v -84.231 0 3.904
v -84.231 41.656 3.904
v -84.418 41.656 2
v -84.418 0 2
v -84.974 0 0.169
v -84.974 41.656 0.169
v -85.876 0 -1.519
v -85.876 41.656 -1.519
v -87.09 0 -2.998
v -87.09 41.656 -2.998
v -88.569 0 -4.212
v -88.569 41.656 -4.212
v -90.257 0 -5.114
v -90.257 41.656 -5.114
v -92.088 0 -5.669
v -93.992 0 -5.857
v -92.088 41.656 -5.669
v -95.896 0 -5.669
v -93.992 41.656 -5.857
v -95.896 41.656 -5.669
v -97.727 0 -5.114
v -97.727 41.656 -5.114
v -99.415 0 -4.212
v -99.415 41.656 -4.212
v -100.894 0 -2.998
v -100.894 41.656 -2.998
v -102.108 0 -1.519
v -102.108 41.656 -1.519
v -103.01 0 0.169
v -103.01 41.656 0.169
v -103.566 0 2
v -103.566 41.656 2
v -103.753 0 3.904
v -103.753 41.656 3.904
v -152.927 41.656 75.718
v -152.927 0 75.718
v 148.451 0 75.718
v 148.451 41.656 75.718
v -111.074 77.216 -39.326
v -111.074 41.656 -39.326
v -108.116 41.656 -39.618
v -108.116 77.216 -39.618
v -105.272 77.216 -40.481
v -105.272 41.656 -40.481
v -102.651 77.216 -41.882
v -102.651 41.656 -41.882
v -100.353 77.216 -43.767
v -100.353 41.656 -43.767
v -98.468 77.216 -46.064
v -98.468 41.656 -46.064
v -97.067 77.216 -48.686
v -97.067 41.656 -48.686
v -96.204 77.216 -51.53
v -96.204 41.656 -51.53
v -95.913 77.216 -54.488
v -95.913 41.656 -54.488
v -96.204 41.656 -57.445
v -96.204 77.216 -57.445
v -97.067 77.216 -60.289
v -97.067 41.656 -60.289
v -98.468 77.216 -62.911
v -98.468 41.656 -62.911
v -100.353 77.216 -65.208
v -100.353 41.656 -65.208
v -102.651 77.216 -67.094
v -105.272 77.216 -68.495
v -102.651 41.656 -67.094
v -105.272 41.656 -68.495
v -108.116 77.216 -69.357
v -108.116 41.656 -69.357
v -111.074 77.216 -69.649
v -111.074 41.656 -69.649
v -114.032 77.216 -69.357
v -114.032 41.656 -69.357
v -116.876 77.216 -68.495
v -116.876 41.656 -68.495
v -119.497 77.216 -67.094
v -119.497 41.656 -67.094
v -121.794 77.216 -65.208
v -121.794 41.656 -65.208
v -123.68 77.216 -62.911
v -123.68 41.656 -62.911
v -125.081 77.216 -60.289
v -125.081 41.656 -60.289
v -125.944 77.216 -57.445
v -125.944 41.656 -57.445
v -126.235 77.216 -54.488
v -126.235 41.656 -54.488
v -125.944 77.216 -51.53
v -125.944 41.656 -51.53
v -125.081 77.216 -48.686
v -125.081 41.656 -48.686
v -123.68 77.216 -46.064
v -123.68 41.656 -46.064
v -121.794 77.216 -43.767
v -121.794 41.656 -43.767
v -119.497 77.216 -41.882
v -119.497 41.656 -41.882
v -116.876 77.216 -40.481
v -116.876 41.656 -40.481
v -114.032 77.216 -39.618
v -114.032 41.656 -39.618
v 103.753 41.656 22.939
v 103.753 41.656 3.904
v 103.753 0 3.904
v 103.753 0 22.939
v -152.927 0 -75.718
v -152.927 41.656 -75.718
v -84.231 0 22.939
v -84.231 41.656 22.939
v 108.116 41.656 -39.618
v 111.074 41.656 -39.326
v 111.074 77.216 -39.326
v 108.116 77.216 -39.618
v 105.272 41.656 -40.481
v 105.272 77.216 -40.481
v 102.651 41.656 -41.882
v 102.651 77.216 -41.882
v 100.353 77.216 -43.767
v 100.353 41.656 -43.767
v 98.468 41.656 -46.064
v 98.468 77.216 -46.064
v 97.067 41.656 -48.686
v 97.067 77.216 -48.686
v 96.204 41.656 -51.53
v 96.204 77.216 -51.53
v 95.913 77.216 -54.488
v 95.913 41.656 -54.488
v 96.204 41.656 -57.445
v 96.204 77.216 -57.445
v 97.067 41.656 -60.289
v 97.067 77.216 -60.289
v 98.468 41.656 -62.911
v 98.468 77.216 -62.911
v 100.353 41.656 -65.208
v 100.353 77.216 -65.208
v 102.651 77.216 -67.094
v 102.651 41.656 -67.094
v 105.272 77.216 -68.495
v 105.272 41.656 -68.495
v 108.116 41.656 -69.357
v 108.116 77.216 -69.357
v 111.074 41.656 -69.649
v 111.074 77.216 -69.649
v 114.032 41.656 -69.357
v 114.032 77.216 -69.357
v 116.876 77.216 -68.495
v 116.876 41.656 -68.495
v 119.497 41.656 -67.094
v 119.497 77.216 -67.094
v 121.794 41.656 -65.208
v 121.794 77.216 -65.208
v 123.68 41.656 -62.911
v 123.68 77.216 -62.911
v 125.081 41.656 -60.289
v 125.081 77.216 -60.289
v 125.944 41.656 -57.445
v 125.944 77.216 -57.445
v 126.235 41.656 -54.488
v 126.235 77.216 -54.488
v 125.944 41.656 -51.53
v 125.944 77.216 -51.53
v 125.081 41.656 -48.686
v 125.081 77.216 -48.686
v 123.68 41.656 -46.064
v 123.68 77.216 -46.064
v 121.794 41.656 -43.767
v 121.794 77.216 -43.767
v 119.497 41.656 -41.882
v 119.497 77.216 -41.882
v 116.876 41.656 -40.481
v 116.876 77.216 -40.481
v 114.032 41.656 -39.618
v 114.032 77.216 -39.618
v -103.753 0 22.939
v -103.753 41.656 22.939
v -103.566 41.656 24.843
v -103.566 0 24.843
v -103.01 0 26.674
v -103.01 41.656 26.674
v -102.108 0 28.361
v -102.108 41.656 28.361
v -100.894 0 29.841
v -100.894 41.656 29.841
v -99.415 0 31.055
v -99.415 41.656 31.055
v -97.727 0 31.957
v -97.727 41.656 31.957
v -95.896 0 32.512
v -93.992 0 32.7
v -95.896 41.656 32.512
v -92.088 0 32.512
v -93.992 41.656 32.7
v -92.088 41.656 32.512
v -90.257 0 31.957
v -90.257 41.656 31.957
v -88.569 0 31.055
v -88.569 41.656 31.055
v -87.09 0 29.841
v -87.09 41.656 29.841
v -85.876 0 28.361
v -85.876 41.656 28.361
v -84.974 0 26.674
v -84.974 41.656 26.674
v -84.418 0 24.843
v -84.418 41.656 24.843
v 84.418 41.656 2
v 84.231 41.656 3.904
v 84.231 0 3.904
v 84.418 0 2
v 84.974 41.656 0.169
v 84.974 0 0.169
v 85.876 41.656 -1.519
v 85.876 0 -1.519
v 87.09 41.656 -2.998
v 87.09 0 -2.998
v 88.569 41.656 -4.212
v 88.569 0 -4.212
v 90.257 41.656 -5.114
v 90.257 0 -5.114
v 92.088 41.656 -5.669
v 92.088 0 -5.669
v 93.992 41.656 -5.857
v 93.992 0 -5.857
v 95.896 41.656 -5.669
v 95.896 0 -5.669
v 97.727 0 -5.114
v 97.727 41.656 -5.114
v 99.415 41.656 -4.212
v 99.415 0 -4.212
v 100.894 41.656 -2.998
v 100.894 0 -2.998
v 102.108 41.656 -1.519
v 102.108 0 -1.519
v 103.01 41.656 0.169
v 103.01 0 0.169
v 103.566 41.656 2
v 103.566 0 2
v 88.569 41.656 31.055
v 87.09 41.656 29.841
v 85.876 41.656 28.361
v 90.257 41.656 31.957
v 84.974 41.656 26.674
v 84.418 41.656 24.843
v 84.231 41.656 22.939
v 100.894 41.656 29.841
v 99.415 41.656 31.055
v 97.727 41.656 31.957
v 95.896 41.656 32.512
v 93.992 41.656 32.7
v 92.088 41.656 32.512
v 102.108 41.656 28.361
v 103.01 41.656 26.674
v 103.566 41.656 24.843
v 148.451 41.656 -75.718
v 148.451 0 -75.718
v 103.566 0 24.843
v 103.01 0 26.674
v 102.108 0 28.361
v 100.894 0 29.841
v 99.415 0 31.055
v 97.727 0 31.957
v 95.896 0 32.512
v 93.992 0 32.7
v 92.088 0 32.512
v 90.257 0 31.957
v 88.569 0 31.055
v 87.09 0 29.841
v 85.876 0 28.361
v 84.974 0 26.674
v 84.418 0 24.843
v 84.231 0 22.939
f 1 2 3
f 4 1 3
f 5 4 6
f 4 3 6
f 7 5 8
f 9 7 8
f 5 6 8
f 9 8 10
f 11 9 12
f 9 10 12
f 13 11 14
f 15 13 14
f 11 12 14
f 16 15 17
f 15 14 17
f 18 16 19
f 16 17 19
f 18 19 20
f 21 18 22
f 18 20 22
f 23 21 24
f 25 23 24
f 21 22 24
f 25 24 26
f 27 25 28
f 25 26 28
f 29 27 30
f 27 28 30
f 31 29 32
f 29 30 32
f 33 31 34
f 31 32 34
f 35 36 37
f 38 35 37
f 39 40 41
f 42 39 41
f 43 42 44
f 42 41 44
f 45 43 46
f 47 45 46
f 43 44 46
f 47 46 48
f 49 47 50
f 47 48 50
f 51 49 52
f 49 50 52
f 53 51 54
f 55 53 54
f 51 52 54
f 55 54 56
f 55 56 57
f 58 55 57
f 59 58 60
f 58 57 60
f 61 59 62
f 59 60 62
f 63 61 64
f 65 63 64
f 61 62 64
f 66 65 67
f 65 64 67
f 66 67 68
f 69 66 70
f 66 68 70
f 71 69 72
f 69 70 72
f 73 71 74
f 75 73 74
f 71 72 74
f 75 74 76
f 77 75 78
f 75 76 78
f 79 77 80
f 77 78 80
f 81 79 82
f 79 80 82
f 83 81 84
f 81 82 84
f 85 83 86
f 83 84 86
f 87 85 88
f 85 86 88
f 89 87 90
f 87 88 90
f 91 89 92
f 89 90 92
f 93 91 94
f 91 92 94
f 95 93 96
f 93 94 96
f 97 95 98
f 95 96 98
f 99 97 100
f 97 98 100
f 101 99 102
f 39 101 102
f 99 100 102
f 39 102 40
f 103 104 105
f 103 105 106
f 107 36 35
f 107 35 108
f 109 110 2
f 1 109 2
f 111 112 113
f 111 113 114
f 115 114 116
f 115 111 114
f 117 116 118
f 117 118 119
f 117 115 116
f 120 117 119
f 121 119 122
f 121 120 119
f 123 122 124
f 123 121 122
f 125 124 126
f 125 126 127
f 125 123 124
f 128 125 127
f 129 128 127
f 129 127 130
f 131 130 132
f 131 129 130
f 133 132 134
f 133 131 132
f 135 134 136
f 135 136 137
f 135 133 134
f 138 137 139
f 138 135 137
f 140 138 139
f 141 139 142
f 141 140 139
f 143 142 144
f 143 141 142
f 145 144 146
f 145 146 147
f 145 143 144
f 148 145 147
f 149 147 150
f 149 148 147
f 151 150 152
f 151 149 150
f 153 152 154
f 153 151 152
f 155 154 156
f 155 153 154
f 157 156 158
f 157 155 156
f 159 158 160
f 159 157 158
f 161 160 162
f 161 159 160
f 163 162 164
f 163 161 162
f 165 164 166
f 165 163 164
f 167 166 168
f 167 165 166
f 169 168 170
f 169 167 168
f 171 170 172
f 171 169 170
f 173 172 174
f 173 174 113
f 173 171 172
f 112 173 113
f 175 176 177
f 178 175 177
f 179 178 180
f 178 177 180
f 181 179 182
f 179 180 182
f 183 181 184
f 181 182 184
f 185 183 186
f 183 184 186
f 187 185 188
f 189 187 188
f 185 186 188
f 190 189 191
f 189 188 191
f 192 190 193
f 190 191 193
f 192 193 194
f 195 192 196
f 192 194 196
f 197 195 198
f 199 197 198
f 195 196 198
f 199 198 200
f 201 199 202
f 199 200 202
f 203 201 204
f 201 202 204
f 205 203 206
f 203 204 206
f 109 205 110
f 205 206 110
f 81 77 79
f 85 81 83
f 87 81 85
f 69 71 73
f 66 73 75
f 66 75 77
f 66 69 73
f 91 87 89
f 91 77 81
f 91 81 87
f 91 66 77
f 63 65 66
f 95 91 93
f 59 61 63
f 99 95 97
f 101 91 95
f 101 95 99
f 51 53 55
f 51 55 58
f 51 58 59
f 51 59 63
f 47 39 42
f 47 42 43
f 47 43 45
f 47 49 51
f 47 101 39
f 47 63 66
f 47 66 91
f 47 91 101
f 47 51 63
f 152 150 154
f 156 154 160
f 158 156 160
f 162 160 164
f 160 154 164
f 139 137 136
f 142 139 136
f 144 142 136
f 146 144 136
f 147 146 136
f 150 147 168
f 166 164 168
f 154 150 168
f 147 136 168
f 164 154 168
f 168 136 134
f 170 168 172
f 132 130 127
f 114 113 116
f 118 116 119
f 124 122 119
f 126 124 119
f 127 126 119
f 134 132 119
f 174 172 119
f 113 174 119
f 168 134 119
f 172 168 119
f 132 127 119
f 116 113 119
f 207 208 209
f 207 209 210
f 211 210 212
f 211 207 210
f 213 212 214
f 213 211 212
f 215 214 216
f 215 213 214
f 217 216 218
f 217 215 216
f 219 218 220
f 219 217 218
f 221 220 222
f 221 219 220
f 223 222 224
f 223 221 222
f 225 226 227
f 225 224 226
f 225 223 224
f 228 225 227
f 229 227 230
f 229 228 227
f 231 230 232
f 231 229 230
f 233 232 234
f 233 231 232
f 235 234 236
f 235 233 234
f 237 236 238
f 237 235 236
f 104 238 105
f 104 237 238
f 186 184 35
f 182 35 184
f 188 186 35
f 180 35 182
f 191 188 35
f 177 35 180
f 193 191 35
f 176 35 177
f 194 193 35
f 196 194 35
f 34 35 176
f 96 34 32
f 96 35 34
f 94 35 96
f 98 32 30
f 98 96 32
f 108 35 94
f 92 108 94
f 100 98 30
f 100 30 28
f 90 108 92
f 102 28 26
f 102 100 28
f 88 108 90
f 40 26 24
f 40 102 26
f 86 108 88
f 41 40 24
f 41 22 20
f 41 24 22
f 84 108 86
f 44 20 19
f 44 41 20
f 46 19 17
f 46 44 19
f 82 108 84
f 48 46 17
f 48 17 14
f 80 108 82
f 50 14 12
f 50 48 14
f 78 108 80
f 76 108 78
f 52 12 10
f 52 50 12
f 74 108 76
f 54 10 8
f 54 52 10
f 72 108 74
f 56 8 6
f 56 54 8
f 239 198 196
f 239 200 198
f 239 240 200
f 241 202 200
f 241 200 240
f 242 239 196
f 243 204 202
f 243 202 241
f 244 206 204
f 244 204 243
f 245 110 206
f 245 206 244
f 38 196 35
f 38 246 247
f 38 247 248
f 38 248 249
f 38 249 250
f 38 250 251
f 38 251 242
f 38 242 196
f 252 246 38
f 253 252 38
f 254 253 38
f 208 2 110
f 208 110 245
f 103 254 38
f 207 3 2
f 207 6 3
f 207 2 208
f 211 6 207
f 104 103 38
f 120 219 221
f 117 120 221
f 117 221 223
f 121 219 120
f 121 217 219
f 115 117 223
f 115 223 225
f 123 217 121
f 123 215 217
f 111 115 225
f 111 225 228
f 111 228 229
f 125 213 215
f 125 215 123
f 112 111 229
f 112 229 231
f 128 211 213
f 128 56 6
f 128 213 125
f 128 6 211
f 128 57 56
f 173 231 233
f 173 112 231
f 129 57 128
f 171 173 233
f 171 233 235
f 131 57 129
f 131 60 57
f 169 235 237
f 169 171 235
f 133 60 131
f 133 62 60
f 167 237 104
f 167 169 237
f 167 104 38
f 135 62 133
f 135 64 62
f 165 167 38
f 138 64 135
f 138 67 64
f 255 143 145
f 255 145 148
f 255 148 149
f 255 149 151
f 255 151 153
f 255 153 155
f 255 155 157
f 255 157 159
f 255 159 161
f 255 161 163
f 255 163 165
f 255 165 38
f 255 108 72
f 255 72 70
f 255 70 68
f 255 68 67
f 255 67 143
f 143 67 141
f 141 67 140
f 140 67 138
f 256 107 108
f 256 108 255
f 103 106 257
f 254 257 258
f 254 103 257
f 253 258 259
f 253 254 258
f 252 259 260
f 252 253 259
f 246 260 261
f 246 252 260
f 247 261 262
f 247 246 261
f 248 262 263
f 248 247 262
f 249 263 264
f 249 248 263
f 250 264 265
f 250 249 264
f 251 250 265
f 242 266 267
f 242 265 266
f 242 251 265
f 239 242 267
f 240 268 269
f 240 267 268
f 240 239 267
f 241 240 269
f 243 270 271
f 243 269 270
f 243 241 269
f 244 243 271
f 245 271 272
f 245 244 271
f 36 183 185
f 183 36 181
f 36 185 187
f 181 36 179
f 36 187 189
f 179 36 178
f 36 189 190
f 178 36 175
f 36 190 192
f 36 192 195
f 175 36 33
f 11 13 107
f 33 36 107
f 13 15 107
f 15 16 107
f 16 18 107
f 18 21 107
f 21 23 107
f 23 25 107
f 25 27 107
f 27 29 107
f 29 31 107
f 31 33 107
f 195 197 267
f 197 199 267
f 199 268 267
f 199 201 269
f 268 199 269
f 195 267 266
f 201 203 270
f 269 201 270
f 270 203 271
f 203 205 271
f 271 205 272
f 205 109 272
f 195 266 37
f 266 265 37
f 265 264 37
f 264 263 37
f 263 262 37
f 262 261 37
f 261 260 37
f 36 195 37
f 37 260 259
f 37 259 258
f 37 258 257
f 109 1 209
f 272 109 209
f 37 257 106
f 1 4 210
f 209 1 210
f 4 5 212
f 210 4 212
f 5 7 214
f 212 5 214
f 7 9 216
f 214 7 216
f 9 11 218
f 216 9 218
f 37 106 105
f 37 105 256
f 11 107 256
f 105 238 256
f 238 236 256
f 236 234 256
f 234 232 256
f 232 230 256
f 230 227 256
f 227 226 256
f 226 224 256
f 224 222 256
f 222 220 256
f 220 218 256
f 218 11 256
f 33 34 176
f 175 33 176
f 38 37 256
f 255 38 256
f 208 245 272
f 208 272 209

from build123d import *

# Parameters (mm, degrees)
SKETCH1_W           = 301.378206246
SKETCH1_H           = 151.435088782
BOSS_EXTRUDE1_DEPTH = 41.656
CUT_EXTRUDE1_DEPTH  = 214.376
SKETCH3_R           = 15.161110792
BOSS_EXTRUDE2_DEPTH = 35.56


with BuildPart() as part:
    # Sketch1 → Boss-Extrude1 (new body)
    with BuildSketch(Plane(origin=(0, 0, 0), x_dir=(1, 0, 0), z_dir=(0, 1, 0))):
        with Locations((-2.237956977, 0)):
            Rectangle(SKETCH1_W, SKETCH1_H)
    extrude(amount=BOSS_EXTRUDE1_DEPTH)

    # Sketch2 → Cut-Extrude1 (cut)
    with BuildSketch(Plane(origin=(0, 41.656, 0), x_dir=(1, 0, 0), z_dir=(0, 1, 0))):
        with BuildLine():
            Line((-103.753069352, -3.904427399), (-103.753069352, -22.938510969))
            ThreePointArc((-103.753069352, -22.938510969), (-93.992000854, -32.699579467), (-84.230932357, -22.938510969))
            Line((-84.230932357, -22.938510969), (-84.230932357, -3.904427399))
            ThreePointArc((-84.230932357, -3.904427399), (-93.992000854, 5.856641099), (-103.753069352, -3.904427399))
        make_face()
    cut_extrude1 = extrude(amount=-CUT_EXTRUDE1_DEPTH, mode=Mode.SUBTRACT)

    # Sketch3 → Boss-Extrude2 (add)
    with BuildSketch(Plane(origin=(0, 41.656, 0), x_dir=(1, 0, 0), z_dir=(0, 1, 0))):
        with Locations(Location((-111.073870725, 54.487556638, 0), (0, 0, 270))):
            Circle(SKETCH3_R)
    boss_extrude2 = extrude(amount=BOSS_EXTRUDE2_DEPTH)

    # Mirror1: Cut-Extrude1, Boss-Extrude2 across plane
    add(cut_extrude1.mirror(Plane(origin=(0, 0, 0), x_dir=(0, 0, 1), z_dir=(1, 0, 0))), mode=Mode.SUBTRACT)
    add(boss_extrude2.mirror(Plane(origin=(0, 0, 0), x_dir=(0, 0, 1), z_dir=(1, 0, 0))))


solid = part.part
